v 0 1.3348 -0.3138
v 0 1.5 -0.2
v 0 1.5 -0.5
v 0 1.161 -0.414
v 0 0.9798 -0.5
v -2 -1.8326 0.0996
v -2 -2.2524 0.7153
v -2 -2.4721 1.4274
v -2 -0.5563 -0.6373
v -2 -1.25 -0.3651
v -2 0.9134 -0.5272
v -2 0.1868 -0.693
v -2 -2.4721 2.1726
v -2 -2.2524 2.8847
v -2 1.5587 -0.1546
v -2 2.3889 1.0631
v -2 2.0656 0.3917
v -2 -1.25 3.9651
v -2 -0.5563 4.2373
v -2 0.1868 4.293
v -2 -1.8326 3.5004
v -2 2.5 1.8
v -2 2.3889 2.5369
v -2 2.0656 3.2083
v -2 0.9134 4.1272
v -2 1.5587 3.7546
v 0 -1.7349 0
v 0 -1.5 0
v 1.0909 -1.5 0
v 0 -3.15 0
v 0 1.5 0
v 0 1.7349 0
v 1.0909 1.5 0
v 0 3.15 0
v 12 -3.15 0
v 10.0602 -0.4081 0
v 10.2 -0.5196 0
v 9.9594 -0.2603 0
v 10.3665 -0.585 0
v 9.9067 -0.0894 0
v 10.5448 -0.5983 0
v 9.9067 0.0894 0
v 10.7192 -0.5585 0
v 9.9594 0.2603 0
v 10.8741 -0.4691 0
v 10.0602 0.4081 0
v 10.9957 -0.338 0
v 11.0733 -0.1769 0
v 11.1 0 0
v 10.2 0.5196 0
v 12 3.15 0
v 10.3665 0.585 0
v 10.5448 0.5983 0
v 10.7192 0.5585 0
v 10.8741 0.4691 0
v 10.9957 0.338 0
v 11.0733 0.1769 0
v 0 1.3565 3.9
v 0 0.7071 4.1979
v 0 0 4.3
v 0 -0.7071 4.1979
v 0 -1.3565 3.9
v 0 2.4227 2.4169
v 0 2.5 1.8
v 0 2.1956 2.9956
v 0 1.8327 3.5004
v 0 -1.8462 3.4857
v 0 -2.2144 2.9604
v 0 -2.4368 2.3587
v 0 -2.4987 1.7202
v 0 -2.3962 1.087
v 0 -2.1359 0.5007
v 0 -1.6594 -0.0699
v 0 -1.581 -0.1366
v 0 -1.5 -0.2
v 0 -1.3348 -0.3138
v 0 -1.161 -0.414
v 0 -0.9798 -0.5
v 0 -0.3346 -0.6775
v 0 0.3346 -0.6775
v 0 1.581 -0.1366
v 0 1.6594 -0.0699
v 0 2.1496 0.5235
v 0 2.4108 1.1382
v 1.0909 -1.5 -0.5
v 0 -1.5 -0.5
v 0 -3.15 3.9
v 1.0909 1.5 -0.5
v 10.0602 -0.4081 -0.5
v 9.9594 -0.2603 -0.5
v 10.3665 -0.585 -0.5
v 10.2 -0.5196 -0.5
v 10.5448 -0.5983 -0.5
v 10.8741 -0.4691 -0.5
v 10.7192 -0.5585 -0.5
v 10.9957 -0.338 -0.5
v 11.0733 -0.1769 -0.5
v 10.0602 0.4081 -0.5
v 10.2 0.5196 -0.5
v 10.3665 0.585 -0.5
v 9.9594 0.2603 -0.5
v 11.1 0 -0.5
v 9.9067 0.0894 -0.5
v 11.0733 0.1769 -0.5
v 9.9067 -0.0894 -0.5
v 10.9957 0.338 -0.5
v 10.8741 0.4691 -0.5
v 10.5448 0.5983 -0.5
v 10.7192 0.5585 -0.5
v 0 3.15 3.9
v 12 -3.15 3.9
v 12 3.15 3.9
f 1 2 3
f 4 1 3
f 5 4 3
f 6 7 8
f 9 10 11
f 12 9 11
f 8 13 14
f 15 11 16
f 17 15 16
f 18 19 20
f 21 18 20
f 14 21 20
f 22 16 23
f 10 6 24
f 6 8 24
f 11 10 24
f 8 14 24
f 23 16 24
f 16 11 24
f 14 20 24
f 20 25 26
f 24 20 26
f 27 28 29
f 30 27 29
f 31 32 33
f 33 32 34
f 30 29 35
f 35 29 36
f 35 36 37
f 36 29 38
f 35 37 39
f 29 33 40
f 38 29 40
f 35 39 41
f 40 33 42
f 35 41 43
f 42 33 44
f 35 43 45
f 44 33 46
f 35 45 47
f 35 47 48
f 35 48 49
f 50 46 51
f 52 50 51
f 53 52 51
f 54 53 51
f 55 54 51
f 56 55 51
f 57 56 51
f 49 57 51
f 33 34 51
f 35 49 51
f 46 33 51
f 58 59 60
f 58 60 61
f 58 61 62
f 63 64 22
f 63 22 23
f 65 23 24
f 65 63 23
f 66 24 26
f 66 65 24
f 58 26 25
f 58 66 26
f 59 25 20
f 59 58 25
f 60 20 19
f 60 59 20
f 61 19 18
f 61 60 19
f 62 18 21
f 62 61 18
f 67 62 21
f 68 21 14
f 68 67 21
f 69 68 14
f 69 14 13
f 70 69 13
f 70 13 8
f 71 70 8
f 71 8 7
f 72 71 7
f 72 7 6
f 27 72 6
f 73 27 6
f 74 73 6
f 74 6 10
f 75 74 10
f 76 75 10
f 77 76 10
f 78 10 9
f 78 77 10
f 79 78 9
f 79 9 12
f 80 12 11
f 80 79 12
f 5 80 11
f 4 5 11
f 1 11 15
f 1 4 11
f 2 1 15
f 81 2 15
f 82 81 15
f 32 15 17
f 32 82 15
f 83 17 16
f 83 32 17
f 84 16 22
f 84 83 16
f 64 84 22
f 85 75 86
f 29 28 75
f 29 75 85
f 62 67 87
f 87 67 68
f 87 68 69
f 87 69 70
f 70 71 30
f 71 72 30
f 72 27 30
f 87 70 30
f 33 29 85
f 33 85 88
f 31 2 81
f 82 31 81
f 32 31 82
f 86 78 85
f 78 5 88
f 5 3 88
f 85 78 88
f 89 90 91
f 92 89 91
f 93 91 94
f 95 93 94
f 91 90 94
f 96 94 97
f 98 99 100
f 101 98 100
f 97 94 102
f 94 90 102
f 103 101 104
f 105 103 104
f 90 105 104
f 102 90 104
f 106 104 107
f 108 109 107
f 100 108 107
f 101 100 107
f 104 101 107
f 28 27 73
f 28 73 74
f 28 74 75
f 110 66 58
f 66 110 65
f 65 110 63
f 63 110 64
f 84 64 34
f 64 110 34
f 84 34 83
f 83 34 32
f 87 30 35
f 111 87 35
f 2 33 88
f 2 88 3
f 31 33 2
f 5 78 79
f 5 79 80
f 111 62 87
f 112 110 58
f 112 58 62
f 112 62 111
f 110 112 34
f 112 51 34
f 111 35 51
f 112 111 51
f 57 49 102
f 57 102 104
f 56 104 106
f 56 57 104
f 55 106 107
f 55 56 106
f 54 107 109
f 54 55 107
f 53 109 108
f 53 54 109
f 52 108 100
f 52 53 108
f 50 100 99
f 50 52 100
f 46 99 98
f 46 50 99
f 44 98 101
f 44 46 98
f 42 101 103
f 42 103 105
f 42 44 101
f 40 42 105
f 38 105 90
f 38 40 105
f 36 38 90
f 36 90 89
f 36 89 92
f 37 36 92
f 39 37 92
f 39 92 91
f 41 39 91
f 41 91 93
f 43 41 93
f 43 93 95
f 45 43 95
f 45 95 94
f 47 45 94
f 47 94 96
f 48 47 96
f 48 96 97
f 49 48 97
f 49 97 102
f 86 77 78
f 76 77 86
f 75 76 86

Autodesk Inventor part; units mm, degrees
sketch "スケッチ1" plane through (0, 0, 0) normal (0, 1, 0) x (-1, 0, 0)
  point P0 (0, 0)
sketch "スケッチ2" plane through (0, 0, 0) normal (0, 0, 1) x (1, 0, 0)
  circle A0 centre (10.5, 0) radius 0.6
  line L0 (-2.22, 0) -> (13.32, 0) projected
  point P0 (0, 0)
  point P1 (0, 0)
  dimension "d0" = 1.2
  dimension "d3" = 10.5
extrude "押し出し1" add sketch "スケッチ2" against normal blind 0.5
sketch "スケッチ4" plane through (0, 0, 0) normal (0, 0, 1) x (1, 0, 0)
  line L0 (12, 3.15) -> (0, 3.15)
  line L1 (0, 3.15) -> (0, -3.15)
  line L2 (0, -3.15) -> (12, -3.15)
  line L3 (12, -3.15) -> (12, 3.15)
  point P0 (0, 0)
  dimension "d4" = 3.15
  dimension "d5" = 6.3
  dimension "d6" = 12
extrude "押し出し2" add sketch "スケッチ4" along normal blind 3.9
sketch "スケッチ5" plane through (0, 0, 0) normal (1, 0, 0) x (0, 1, 0)
  circle A0 centre (0, 1.8) radius 2.5
  point P0 (0, 0)
  dimension "d9" = 5
  dimension "d10" = 1.8
extrude "押し出し3" add sketch "スケッチ5" against normal blind 2
sketch "スケッチ6" plane through (0, 0, 0) normal (0, 0, 1) x (1, 0, 0)
  line L0 (0, -1.5) -> (1.0909, -1.5)
  line L1 (1.0909, -1.5) -> (1.0909, 1.5)
  line L2 (1.0909, 1.5) -> (0, 1.5)
  line L3 (0, 1.5) -> (0, -1.5)
  line L4 (-4.8, 0) -> (14.8, 0) projected
  point P0 (0, 0)
  dimension "d13" = 3
  dimension "d14" = 1.5
extrude "押し出し4" add sketch "スケッチ6" against normal blind 0.5
properties part number "ST-PJ-312"
